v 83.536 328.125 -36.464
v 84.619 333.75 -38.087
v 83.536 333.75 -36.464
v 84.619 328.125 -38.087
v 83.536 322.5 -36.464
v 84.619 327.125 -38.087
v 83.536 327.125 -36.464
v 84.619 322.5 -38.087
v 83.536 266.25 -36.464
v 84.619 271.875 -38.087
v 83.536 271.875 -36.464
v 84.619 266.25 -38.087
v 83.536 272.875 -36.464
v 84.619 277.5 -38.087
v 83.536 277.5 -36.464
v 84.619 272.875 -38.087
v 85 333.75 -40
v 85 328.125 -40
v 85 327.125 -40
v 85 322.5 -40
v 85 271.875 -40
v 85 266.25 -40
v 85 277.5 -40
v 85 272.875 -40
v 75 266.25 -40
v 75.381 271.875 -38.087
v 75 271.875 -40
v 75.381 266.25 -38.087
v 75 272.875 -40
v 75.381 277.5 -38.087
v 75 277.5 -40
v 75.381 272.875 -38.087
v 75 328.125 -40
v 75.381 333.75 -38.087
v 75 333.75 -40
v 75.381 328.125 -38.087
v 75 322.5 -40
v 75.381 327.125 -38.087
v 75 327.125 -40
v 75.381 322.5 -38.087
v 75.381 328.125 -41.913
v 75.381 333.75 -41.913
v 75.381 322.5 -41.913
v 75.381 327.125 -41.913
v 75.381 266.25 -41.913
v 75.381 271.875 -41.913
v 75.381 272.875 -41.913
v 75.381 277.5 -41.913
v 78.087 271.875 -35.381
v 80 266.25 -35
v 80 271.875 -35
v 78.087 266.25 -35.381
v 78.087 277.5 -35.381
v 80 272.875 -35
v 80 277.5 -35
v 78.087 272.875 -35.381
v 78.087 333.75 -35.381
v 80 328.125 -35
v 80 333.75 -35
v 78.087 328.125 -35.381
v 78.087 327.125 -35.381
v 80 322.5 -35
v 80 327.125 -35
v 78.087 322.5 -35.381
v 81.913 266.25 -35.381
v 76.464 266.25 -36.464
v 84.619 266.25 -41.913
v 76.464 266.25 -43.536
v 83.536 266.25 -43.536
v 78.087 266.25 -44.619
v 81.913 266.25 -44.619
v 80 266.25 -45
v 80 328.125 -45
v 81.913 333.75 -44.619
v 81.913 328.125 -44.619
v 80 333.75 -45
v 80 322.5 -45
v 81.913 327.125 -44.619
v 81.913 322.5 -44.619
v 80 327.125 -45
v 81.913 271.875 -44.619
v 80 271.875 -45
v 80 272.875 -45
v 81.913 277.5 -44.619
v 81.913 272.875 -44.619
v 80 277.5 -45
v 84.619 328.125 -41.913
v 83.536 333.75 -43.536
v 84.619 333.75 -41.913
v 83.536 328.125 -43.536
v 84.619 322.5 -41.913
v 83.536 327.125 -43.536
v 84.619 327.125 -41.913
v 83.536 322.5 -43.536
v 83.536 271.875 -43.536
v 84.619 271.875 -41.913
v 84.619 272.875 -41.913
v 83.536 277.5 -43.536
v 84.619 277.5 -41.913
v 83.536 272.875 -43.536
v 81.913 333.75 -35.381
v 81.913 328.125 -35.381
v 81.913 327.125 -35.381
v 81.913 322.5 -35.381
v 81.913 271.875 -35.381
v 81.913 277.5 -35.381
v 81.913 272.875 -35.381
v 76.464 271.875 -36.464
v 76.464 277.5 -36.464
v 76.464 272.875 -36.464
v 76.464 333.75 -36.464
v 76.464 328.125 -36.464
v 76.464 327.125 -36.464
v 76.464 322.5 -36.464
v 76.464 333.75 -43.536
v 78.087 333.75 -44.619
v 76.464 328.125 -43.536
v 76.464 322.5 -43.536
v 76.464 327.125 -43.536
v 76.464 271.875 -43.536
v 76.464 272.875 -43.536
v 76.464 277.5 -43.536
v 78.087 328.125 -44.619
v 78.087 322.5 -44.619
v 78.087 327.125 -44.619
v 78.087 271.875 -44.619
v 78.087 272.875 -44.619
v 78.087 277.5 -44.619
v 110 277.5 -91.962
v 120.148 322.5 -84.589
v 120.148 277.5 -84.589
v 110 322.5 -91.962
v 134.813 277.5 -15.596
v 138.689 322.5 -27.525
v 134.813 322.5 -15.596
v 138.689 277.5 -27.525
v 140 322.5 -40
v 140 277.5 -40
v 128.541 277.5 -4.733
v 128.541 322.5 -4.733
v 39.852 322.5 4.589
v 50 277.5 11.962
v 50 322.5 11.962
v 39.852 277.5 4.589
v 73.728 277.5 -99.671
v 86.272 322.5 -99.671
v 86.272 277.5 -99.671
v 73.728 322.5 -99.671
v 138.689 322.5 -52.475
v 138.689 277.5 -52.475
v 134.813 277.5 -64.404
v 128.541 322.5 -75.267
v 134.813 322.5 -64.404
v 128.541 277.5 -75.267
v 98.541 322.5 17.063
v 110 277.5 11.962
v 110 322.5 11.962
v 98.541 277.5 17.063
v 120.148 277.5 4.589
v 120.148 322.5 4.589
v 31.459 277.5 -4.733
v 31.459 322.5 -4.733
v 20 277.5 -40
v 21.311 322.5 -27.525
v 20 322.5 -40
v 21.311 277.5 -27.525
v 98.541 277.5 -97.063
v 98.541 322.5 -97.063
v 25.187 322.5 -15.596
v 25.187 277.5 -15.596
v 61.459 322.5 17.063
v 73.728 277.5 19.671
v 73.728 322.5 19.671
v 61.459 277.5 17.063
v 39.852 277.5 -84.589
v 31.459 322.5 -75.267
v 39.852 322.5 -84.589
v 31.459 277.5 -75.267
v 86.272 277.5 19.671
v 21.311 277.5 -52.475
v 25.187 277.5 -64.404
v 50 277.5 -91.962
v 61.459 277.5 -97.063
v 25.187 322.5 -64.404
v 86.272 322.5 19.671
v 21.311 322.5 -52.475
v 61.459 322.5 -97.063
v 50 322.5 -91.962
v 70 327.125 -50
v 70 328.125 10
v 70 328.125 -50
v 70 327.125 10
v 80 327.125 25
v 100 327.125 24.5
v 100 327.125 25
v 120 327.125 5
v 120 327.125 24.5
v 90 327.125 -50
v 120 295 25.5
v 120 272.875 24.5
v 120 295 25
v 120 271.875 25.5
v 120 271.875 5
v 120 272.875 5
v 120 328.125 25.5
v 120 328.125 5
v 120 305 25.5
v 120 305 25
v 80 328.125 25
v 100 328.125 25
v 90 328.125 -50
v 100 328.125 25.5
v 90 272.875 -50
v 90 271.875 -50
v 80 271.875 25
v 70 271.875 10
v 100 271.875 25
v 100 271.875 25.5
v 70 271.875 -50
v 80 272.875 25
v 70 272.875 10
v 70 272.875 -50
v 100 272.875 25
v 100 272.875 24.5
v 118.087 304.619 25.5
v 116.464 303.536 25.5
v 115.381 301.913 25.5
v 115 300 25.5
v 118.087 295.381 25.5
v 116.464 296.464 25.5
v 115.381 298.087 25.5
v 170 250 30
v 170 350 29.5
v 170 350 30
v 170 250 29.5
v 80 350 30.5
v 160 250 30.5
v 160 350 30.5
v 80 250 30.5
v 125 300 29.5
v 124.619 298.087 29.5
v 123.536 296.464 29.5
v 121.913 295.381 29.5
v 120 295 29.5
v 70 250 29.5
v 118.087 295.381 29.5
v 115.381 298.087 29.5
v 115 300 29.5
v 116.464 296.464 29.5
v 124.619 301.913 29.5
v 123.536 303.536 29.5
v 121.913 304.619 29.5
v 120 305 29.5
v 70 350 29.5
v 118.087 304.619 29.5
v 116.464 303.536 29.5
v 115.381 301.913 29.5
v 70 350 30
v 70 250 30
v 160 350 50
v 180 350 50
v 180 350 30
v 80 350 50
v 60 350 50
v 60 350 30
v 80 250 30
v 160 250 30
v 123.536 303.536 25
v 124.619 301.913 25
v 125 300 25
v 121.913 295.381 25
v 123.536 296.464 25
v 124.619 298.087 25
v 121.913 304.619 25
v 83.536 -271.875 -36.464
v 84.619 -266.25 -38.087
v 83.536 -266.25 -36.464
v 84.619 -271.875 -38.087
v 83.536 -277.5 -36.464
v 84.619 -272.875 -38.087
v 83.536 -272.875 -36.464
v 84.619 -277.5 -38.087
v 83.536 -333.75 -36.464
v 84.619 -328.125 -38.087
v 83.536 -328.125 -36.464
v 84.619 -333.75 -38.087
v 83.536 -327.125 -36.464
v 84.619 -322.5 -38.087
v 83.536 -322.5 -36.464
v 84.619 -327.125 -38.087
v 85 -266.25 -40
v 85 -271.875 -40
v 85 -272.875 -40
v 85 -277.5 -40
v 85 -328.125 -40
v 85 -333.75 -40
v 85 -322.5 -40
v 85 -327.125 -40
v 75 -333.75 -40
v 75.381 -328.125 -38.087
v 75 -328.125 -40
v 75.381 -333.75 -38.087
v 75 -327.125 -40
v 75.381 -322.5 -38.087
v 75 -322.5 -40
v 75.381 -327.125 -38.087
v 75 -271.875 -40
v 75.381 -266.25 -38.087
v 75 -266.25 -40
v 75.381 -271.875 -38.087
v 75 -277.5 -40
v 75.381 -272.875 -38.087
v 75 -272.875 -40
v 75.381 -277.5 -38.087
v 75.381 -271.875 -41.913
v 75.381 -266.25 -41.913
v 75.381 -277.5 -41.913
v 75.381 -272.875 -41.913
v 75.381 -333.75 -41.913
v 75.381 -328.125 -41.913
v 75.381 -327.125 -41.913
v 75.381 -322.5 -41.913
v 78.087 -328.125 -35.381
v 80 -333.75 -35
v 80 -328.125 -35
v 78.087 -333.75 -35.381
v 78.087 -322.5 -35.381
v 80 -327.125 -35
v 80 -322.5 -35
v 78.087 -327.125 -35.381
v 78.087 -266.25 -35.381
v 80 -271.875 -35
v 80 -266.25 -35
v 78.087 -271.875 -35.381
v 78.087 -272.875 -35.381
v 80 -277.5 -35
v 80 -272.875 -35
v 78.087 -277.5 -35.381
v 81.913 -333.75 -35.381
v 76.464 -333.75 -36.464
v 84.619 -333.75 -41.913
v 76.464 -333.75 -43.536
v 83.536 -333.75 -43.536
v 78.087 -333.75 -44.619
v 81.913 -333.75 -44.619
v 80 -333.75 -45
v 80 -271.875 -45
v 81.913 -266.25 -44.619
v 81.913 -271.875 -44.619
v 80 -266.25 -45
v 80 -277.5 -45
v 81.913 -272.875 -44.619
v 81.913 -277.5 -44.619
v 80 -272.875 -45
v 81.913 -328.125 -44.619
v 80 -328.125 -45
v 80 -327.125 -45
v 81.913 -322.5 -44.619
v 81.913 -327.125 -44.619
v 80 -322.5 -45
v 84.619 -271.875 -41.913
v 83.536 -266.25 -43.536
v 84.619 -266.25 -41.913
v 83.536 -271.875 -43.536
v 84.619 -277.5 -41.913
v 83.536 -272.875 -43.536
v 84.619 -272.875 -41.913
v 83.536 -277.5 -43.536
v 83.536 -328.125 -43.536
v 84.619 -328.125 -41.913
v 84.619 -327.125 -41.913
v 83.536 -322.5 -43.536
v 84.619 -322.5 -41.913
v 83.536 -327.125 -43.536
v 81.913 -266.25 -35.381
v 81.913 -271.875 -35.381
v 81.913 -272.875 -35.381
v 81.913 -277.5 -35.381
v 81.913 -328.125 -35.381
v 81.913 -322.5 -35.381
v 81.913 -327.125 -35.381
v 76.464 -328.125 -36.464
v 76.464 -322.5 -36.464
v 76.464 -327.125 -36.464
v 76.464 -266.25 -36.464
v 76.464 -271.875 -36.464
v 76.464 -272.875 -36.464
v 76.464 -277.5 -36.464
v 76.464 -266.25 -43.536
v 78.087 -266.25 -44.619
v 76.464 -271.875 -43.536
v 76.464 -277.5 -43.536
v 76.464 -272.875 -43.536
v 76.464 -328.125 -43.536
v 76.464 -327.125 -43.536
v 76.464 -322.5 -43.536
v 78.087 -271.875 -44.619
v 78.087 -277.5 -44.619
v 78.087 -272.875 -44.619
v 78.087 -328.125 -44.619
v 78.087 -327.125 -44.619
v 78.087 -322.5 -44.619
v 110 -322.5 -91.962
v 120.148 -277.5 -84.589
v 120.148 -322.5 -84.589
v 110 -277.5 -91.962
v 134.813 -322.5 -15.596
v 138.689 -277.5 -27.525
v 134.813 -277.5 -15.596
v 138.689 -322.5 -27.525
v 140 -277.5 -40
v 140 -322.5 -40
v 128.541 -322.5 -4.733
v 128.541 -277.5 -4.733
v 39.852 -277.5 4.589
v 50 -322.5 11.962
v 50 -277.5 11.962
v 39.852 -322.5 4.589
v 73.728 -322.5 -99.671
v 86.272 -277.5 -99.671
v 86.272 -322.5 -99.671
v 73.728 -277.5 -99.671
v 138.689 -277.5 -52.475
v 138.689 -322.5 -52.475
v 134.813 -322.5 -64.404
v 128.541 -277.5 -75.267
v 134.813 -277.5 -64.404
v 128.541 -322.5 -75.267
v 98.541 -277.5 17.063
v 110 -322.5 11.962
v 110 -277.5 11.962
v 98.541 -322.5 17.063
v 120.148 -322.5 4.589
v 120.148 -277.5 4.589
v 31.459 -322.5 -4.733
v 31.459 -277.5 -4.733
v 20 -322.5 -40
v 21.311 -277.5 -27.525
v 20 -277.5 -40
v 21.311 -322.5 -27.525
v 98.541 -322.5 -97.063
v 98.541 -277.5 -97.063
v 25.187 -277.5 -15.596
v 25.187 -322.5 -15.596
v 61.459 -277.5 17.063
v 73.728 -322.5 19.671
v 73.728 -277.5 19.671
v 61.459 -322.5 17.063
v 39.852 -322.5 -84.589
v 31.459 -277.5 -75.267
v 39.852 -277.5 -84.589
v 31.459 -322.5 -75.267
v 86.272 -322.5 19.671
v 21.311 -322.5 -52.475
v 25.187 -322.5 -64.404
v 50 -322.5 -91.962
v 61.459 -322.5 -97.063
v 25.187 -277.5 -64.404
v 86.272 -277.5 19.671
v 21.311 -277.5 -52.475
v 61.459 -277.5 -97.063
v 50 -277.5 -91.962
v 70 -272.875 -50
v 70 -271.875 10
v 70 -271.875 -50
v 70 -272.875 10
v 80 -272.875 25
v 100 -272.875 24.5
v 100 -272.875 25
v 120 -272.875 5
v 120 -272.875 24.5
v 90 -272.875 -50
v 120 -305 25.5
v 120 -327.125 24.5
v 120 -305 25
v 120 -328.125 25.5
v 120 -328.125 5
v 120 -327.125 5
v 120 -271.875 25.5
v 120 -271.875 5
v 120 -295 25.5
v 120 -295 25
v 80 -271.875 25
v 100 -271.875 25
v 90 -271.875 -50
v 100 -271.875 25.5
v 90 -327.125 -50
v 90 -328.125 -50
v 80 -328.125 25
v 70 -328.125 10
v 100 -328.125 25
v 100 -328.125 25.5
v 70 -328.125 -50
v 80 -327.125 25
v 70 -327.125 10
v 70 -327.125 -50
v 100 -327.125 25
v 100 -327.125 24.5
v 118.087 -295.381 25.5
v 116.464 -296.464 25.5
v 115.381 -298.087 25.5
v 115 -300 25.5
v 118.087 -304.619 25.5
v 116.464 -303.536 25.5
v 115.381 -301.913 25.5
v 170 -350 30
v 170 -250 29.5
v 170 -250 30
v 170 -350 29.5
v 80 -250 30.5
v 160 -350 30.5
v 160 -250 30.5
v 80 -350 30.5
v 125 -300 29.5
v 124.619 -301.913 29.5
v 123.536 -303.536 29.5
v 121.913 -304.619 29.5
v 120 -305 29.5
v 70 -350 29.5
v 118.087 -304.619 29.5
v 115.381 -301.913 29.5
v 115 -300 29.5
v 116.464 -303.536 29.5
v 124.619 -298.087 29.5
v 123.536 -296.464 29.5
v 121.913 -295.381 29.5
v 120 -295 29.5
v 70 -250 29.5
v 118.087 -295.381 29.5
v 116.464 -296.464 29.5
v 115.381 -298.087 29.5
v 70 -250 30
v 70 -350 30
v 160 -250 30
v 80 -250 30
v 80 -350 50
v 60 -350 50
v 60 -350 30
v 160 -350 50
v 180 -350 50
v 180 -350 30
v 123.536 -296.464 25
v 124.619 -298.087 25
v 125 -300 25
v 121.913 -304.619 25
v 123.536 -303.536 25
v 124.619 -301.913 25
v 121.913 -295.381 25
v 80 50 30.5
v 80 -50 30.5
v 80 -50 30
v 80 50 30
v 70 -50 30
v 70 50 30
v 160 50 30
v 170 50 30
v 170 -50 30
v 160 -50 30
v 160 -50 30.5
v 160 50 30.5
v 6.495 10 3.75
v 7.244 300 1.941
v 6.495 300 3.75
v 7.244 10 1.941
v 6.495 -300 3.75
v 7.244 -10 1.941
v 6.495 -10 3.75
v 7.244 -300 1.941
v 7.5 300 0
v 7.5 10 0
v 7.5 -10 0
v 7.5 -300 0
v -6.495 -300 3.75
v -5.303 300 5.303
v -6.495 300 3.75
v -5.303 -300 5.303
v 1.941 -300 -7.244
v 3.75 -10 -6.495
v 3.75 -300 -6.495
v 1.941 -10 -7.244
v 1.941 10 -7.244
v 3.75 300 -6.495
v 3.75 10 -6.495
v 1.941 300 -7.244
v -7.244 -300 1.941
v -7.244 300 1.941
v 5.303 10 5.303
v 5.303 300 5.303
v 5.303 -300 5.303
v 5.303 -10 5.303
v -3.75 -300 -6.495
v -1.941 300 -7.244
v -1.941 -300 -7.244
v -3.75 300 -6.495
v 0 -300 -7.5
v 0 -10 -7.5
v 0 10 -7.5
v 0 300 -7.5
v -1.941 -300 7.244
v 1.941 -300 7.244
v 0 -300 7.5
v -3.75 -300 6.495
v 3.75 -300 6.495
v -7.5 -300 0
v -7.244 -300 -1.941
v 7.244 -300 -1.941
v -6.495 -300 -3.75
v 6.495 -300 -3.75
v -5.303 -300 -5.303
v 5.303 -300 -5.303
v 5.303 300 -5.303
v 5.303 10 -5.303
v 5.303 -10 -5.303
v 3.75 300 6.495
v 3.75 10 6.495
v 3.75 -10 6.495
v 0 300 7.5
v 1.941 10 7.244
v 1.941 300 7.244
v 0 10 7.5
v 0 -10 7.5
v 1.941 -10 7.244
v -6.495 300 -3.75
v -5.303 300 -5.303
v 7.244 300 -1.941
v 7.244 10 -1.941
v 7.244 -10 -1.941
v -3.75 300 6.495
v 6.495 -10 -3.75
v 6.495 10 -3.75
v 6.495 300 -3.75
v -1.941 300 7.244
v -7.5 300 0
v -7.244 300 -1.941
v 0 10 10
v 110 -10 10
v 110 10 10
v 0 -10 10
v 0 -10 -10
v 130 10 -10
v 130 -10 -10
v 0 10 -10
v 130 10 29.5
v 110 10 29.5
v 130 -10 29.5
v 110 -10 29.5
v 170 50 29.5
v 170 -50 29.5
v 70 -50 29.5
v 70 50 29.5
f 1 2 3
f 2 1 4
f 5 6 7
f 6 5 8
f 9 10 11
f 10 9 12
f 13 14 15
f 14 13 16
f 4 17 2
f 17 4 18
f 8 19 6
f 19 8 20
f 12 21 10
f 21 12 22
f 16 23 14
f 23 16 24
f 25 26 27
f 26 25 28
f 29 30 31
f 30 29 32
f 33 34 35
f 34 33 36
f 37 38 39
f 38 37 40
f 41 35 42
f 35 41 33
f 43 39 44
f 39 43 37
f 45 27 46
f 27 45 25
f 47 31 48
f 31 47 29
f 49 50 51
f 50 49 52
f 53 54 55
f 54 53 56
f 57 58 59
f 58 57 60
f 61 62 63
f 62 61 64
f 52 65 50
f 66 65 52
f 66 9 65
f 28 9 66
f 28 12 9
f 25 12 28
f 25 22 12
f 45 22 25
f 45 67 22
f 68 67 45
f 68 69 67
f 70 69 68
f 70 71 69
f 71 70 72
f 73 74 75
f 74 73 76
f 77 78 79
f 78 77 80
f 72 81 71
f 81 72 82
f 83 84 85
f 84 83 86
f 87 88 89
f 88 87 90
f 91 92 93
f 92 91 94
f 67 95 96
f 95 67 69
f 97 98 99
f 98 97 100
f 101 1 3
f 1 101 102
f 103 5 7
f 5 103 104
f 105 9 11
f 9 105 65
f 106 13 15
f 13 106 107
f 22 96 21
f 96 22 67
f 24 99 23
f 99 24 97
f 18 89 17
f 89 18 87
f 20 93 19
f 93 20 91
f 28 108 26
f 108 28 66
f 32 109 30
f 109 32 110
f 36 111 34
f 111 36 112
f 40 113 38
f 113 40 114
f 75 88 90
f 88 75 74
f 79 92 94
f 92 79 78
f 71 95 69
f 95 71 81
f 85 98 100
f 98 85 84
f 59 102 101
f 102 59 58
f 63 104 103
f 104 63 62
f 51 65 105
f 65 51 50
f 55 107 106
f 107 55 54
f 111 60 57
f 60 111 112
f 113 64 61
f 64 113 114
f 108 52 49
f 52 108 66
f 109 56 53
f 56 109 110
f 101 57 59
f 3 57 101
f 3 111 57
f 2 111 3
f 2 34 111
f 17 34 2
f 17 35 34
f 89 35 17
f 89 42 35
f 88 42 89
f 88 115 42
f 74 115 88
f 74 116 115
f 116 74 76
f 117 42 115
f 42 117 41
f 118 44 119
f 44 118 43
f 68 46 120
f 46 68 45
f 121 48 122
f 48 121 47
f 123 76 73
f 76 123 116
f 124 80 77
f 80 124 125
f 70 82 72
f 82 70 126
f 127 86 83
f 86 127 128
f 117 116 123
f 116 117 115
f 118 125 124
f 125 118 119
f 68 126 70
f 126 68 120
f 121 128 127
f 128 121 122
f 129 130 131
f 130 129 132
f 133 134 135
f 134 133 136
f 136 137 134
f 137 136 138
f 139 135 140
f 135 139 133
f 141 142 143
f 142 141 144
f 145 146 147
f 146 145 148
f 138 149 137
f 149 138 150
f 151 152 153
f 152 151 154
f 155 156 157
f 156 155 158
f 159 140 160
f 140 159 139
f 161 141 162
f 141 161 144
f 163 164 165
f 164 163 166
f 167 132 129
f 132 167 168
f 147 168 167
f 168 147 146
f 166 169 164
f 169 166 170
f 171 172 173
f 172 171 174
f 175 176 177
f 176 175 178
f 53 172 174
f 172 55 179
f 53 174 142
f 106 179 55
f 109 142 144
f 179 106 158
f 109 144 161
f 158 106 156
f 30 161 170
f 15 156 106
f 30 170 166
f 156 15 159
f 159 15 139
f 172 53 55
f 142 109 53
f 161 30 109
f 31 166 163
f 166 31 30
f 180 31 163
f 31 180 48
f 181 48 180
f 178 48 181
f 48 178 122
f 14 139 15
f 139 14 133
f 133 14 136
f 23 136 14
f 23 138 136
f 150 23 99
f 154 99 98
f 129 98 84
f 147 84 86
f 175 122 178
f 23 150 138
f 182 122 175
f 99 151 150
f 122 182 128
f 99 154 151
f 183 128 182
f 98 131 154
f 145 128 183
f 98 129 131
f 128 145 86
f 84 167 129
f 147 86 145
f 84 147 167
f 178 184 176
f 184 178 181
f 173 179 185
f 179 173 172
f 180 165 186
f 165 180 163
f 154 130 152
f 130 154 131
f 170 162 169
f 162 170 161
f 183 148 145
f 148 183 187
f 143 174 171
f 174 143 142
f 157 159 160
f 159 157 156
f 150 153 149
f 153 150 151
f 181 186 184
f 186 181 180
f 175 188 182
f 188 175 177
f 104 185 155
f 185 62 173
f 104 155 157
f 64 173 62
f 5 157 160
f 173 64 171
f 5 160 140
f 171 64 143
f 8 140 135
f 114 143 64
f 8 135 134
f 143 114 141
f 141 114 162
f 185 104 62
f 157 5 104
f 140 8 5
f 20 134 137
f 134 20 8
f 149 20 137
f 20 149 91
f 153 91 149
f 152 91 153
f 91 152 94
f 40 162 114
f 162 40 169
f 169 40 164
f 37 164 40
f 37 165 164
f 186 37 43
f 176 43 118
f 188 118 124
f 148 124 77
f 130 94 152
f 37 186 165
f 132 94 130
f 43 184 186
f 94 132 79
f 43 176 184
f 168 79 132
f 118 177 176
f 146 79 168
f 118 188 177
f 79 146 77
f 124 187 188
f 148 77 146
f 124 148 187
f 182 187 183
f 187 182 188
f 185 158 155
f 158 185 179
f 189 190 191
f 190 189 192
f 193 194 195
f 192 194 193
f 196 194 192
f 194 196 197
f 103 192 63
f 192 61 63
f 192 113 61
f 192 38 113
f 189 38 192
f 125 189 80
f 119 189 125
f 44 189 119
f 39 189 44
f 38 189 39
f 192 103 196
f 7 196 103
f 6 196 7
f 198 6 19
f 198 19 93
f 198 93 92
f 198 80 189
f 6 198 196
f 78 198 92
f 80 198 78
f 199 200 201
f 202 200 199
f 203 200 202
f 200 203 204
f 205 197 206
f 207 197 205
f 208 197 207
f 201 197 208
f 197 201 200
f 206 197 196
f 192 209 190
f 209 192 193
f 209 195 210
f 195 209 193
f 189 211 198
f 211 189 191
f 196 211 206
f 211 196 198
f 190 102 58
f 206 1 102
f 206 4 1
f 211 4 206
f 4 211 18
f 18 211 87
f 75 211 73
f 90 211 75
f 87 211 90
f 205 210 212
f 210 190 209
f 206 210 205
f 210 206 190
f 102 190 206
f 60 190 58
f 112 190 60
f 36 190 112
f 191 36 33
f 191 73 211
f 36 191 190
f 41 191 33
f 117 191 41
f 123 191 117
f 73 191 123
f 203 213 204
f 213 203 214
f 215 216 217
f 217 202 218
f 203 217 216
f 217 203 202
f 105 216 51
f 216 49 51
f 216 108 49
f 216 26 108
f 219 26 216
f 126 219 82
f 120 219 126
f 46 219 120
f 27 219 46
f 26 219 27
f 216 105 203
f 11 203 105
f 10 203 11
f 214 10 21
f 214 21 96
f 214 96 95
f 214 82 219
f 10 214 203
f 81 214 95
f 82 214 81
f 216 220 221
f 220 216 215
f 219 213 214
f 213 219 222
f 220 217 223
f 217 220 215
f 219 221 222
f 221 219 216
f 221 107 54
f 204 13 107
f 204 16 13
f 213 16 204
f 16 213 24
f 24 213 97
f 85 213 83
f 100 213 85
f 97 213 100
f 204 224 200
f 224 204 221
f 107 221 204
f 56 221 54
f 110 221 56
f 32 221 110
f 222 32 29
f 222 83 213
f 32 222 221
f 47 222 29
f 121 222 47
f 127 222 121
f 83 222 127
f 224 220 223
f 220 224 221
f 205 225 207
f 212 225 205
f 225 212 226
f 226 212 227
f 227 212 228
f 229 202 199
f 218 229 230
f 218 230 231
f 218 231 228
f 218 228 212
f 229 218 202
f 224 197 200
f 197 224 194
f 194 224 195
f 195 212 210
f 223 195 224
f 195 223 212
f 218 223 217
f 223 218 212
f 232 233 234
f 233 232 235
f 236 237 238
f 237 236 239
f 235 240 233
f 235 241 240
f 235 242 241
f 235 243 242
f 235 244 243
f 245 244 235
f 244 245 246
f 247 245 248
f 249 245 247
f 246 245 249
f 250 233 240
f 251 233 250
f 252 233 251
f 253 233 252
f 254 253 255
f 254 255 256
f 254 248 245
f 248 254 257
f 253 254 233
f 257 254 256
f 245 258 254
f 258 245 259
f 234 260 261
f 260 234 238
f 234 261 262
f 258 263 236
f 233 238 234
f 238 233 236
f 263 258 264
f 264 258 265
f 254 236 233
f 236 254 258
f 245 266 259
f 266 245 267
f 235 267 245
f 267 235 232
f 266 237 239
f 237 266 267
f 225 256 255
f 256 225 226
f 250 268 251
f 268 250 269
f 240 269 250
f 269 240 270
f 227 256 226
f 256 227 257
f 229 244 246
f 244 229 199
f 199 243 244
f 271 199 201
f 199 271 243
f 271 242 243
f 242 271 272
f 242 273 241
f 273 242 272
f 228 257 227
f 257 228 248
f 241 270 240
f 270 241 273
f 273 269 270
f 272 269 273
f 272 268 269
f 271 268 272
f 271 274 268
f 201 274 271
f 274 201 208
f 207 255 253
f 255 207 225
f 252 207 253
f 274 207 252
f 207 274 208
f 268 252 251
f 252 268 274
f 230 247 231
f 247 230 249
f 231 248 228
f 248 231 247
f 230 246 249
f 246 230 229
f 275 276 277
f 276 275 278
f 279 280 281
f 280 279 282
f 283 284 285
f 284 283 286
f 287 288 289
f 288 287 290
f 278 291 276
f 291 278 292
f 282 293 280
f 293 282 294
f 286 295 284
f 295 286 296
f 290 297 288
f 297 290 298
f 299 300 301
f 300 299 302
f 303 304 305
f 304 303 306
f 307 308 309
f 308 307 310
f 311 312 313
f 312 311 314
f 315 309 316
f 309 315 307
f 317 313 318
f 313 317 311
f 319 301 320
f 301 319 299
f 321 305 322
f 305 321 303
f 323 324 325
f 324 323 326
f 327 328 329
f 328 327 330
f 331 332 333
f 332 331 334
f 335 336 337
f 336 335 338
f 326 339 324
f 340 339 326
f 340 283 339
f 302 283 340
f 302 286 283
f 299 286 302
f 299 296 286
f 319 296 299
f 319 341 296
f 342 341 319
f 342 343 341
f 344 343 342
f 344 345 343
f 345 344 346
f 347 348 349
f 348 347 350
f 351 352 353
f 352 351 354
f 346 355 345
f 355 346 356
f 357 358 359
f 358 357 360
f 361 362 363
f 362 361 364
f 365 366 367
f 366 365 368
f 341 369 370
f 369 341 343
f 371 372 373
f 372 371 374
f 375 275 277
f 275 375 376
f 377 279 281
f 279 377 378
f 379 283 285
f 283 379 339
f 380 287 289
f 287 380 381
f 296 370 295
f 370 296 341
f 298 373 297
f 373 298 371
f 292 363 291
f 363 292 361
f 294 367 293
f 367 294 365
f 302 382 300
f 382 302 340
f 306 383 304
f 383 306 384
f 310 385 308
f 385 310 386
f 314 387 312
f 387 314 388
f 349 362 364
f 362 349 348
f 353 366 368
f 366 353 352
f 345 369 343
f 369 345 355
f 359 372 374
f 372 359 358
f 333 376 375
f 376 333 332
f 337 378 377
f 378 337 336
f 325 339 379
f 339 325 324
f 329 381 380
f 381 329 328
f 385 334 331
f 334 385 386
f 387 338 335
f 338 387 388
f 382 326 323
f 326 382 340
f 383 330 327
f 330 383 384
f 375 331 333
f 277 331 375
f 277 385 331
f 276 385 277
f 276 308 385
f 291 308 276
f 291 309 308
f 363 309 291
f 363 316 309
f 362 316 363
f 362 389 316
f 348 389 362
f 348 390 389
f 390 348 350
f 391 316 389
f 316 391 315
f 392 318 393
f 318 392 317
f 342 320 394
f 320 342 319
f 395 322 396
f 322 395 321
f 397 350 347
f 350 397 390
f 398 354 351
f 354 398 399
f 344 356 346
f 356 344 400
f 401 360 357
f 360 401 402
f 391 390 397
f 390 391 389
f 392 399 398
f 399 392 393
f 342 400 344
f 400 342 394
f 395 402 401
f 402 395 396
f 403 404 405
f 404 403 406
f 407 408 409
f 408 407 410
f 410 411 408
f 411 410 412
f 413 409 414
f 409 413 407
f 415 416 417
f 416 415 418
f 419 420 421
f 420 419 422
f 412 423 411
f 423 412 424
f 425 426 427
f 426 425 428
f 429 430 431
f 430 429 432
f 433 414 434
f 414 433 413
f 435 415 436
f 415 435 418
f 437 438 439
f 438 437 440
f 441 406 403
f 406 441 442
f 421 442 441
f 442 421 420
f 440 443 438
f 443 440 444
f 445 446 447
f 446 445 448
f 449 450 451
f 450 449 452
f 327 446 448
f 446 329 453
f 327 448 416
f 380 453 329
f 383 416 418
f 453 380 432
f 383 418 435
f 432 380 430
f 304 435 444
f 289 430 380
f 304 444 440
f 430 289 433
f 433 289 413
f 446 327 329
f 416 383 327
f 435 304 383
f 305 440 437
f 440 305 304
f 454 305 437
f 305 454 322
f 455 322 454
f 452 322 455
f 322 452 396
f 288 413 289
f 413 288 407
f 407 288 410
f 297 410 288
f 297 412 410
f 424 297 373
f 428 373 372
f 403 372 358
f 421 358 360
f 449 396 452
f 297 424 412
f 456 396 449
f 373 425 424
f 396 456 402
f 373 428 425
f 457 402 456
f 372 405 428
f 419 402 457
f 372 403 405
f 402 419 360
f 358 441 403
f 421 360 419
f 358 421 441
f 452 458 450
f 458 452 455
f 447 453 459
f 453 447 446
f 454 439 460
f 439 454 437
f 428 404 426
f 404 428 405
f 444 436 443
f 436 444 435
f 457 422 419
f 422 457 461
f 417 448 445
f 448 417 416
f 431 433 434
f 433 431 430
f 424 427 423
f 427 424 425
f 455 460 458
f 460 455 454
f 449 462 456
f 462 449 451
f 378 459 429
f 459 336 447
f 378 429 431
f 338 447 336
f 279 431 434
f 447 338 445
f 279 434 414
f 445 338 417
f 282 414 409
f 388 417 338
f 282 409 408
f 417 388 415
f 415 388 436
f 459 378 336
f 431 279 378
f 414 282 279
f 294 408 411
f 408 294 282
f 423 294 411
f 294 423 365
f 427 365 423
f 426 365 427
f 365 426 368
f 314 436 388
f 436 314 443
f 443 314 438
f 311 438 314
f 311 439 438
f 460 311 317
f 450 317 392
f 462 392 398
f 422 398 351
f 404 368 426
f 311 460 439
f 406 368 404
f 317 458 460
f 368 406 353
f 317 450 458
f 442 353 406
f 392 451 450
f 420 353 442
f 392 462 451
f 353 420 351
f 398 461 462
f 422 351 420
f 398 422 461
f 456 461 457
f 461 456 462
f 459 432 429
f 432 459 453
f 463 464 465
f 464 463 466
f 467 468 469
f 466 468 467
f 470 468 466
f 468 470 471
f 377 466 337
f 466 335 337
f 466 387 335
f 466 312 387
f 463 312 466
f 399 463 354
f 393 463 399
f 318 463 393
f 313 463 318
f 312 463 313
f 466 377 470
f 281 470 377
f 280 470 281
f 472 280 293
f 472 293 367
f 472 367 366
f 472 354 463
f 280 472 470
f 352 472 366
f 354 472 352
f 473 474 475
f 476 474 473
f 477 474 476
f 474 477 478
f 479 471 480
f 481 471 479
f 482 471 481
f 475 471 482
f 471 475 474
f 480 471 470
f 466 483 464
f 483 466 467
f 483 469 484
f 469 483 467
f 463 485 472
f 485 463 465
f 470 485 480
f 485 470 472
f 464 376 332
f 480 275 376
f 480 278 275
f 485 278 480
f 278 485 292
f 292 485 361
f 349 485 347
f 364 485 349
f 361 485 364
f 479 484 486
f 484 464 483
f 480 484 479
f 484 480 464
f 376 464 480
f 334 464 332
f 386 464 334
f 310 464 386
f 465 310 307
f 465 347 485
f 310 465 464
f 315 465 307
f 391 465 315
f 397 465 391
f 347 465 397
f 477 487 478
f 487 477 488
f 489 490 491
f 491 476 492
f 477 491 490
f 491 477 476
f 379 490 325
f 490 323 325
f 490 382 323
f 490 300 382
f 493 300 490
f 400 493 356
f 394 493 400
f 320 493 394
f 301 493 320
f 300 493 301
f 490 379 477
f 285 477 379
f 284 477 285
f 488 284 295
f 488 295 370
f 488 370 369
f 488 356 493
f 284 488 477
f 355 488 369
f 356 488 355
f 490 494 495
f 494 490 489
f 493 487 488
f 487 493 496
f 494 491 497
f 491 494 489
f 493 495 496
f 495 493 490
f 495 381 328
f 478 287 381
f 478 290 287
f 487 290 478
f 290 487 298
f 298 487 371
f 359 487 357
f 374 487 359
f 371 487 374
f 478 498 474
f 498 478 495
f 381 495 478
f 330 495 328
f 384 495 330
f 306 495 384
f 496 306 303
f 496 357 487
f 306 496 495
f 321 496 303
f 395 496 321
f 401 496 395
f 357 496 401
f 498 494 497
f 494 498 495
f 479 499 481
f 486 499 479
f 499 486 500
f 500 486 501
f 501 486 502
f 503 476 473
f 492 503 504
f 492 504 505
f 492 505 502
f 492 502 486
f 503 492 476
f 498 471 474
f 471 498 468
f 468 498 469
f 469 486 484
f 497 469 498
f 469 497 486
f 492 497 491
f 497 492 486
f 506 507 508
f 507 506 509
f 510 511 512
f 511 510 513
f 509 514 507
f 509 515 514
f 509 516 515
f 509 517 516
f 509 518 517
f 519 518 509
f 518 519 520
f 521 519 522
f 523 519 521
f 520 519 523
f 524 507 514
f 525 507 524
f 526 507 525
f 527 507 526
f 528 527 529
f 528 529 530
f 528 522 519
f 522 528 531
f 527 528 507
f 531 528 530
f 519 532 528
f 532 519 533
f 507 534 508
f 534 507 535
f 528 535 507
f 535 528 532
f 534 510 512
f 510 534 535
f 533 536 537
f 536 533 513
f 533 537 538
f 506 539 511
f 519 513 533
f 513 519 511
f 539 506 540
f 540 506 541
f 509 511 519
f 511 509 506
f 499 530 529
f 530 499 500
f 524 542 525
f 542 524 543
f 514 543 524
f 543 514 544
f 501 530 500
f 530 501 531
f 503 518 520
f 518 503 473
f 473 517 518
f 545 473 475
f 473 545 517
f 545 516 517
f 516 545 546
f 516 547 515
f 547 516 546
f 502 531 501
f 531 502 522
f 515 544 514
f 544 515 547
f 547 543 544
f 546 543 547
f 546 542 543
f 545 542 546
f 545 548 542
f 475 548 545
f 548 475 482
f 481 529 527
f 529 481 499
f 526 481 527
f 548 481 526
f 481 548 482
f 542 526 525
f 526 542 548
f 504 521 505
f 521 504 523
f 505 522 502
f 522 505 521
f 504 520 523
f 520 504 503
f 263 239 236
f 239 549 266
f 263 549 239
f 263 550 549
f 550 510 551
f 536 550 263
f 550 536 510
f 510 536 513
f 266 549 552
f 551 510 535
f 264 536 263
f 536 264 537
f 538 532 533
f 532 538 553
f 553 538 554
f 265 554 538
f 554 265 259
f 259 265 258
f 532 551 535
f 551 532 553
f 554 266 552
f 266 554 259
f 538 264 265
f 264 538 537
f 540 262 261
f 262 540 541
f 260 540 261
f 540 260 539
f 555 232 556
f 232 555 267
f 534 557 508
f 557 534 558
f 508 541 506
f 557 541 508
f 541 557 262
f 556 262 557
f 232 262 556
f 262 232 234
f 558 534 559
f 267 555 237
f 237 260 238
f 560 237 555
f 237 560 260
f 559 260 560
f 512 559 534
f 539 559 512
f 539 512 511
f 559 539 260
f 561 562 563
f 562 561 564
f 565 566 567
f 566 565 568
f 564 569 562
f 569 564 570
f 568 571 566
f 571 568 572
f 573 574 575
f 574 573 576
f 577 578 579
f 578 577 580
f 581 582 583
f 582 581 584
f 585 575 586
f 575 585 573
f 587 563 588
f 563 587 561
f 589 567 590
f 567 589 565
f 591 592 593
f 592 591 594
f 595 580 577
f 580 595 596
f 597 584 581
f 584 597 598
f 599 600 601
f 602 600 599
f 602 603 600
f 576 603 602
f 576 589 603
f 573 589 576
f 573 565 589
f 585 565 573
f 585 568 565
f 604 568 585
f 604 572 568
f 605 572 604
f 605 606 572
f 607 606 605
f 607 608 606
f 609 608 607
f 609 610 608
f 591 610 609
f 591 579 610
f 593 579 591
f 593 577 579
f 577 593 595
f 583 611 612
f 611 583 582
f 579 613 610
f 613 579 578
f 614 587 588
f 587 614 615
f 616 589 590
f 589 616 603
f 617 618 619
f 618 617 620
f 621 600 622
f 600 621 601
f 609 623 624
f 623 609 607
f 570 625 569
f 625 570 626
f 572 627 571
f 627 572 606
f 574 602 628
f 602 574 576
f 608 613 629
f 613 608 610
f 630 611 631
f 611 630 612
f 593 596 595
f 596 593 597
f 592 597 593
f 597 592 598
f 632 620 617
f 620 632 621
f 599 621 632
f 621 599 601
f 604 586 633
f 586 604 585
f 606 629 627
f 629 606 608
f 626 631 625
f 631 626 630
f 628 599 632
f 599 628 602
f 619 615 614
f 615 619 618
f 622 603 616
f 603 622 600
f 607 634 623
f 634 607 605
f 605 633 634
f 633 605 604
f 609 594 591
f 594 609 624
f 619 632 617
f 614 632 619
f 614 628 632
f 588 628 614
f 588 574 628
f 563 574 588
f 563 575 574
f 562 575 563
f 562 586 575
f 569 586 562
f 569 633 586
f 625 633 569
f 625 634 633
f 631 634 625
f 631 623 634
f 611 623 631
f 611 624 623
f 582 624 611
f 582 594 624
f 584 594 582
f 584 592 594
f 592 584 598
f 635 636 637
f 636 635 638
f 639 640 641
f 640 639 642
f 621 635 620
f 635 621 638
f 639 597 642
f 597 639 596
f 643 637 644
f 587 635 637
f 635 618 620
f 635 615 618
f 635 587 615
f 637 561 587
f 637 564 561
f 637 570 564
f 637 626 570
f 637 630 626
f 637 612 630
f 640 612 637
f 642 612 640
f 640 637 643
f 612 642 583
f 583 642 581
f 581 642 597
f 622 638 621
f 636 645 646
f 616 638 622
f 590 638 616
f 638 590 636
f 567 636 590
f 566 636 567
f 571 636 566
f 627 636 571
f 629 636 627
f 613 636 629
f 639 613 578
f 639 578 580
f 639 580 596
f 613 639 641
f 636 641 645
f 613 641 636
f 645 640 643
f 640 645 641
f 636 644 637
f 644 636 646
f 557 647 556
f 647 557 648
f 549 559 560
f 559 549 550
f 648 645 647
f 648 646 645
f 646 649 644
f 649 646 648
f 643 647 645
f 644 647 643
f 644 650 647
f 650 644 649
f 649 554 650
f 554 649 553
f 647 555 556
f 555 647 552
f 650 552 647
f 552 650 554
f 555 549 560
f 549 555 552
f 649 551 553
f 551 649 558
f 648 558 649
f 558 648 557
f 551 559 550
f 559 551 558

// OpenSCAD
// file: CastorWheel.scad
module CastorWheel(lod=0, wheeldiam=120, wheelwidth=45, castordistance=40, platesize=100, totalheight=130, wheeltheta=00, castortheta=0){
    
    module CastorHalfArm(){
        hull(){
            translate([0, wheelwidth/2*1.25, wheeldiam/2-5])
            rotate([90, 0, 0])
            translate([0, -10, 0])
            cube([castordistance, 20, 1], center=false);
            
            translate([0, wheelwidth/2*1.25, -10])
            rotate([90, -90, 0])
            translate([0, -10, 0])
            cube([wheeldiam/2, 20, 1], center=false);
        }
    }
    
    module CastorArm(){
        CastorHalfArm();
        mirror([0, 1, 0]){
            CastorHalfArm();
        }
        translate([castordistance-10, 0, wheeldiam/2+5])
        {
            cube([20, wheelwidth*1.25, 1], center=true);
        }
    }
    //CastorArm();
    
    if (lod==0){
        cube([platesize, platesize, 1], center=true);
        translate([0,0,-5])
        color([1,0,0])
        cylinder(5, d=10);
        rotate([0, 0, castortheta]) {

            
            translate([-castordistance, 0, -totalheight+wheeldiam/2]){
                rotate([90, 0, 0]) {
                    color([1,0,0])
                    cylinder(h=wheelwidth*1.5, d=10, center=true);    
                    
                    rotate([0, 0, wheeltheta])
                    color([.3,.3,.3])
                    cylinder(h=wheelwidth, d=wheeldiam, center=true);
                };
                CastorArm();
            }
        }
    }
}

CastorWheel();
// main file
use <CastorWheel.scad>
module CastorAxle(lod=0, wheelbase=600, tubeprofile=[20, 20], extends=50, castor_angles = [[$t*360, $t*360], [$t*360, $t*360]]){
   if (lod==0) {
        translate([-50, 0, tubeprofile[1]/2])
       cube([tubeprofile[0], wheelbase+extends*2, tubeprofile[1]], center=true);
       
       translate([50, 0, tubeprofile[1]/2])
       cube([tubeprofile[0], wheelbase+extends*2, tubeprofile[1]], center=true);
       
       w=[1, -1];
       for (i=[0:1]){
           translate([0, w[i]*wheelbase/2, 0])
           CastorWheel(castortheta=castor_angles[i][0], wheeltheta=castor_angles[i][1]);
       }
   }
}

module CastorAxleJoint(lod=0, wheelbase=600, tubeprofile=[20, 20], extends=50, axle_x=150, axle_z=50, castor_angles = [[$t*360, $t*360], [$t*360, $t*360]]){
    rotate([90, 0, 0])
    cylinder(h=wheelbase, d=15, center=true);
    
    
    translate([axle_x/2, 0, 0])
    cube([axle_x, tubeprofile[0], tubeprofile[1]], center=true);
    
    translate([axle_x, 0, axle_z/2-tubeprofile[1]/4]){
        cube([tubeprofile[1], tubeprofile[0], axle_z+tubeprofile[1]/2], center=true);
    }
    
    translate([axle_x, 0, axle_z])
    cube([100, 100, 1], center=true);
    
    translate([axle_x, 0, axle_z])
    CastorAxle(lod=lod, wheelbase=wheelbase, tubeprofile=tubeprofile, extends=extends, castor_angles=castor_angles);
}

CastorAxleJoint(wheelbase=600, axle_z=30, axle_x=120);
